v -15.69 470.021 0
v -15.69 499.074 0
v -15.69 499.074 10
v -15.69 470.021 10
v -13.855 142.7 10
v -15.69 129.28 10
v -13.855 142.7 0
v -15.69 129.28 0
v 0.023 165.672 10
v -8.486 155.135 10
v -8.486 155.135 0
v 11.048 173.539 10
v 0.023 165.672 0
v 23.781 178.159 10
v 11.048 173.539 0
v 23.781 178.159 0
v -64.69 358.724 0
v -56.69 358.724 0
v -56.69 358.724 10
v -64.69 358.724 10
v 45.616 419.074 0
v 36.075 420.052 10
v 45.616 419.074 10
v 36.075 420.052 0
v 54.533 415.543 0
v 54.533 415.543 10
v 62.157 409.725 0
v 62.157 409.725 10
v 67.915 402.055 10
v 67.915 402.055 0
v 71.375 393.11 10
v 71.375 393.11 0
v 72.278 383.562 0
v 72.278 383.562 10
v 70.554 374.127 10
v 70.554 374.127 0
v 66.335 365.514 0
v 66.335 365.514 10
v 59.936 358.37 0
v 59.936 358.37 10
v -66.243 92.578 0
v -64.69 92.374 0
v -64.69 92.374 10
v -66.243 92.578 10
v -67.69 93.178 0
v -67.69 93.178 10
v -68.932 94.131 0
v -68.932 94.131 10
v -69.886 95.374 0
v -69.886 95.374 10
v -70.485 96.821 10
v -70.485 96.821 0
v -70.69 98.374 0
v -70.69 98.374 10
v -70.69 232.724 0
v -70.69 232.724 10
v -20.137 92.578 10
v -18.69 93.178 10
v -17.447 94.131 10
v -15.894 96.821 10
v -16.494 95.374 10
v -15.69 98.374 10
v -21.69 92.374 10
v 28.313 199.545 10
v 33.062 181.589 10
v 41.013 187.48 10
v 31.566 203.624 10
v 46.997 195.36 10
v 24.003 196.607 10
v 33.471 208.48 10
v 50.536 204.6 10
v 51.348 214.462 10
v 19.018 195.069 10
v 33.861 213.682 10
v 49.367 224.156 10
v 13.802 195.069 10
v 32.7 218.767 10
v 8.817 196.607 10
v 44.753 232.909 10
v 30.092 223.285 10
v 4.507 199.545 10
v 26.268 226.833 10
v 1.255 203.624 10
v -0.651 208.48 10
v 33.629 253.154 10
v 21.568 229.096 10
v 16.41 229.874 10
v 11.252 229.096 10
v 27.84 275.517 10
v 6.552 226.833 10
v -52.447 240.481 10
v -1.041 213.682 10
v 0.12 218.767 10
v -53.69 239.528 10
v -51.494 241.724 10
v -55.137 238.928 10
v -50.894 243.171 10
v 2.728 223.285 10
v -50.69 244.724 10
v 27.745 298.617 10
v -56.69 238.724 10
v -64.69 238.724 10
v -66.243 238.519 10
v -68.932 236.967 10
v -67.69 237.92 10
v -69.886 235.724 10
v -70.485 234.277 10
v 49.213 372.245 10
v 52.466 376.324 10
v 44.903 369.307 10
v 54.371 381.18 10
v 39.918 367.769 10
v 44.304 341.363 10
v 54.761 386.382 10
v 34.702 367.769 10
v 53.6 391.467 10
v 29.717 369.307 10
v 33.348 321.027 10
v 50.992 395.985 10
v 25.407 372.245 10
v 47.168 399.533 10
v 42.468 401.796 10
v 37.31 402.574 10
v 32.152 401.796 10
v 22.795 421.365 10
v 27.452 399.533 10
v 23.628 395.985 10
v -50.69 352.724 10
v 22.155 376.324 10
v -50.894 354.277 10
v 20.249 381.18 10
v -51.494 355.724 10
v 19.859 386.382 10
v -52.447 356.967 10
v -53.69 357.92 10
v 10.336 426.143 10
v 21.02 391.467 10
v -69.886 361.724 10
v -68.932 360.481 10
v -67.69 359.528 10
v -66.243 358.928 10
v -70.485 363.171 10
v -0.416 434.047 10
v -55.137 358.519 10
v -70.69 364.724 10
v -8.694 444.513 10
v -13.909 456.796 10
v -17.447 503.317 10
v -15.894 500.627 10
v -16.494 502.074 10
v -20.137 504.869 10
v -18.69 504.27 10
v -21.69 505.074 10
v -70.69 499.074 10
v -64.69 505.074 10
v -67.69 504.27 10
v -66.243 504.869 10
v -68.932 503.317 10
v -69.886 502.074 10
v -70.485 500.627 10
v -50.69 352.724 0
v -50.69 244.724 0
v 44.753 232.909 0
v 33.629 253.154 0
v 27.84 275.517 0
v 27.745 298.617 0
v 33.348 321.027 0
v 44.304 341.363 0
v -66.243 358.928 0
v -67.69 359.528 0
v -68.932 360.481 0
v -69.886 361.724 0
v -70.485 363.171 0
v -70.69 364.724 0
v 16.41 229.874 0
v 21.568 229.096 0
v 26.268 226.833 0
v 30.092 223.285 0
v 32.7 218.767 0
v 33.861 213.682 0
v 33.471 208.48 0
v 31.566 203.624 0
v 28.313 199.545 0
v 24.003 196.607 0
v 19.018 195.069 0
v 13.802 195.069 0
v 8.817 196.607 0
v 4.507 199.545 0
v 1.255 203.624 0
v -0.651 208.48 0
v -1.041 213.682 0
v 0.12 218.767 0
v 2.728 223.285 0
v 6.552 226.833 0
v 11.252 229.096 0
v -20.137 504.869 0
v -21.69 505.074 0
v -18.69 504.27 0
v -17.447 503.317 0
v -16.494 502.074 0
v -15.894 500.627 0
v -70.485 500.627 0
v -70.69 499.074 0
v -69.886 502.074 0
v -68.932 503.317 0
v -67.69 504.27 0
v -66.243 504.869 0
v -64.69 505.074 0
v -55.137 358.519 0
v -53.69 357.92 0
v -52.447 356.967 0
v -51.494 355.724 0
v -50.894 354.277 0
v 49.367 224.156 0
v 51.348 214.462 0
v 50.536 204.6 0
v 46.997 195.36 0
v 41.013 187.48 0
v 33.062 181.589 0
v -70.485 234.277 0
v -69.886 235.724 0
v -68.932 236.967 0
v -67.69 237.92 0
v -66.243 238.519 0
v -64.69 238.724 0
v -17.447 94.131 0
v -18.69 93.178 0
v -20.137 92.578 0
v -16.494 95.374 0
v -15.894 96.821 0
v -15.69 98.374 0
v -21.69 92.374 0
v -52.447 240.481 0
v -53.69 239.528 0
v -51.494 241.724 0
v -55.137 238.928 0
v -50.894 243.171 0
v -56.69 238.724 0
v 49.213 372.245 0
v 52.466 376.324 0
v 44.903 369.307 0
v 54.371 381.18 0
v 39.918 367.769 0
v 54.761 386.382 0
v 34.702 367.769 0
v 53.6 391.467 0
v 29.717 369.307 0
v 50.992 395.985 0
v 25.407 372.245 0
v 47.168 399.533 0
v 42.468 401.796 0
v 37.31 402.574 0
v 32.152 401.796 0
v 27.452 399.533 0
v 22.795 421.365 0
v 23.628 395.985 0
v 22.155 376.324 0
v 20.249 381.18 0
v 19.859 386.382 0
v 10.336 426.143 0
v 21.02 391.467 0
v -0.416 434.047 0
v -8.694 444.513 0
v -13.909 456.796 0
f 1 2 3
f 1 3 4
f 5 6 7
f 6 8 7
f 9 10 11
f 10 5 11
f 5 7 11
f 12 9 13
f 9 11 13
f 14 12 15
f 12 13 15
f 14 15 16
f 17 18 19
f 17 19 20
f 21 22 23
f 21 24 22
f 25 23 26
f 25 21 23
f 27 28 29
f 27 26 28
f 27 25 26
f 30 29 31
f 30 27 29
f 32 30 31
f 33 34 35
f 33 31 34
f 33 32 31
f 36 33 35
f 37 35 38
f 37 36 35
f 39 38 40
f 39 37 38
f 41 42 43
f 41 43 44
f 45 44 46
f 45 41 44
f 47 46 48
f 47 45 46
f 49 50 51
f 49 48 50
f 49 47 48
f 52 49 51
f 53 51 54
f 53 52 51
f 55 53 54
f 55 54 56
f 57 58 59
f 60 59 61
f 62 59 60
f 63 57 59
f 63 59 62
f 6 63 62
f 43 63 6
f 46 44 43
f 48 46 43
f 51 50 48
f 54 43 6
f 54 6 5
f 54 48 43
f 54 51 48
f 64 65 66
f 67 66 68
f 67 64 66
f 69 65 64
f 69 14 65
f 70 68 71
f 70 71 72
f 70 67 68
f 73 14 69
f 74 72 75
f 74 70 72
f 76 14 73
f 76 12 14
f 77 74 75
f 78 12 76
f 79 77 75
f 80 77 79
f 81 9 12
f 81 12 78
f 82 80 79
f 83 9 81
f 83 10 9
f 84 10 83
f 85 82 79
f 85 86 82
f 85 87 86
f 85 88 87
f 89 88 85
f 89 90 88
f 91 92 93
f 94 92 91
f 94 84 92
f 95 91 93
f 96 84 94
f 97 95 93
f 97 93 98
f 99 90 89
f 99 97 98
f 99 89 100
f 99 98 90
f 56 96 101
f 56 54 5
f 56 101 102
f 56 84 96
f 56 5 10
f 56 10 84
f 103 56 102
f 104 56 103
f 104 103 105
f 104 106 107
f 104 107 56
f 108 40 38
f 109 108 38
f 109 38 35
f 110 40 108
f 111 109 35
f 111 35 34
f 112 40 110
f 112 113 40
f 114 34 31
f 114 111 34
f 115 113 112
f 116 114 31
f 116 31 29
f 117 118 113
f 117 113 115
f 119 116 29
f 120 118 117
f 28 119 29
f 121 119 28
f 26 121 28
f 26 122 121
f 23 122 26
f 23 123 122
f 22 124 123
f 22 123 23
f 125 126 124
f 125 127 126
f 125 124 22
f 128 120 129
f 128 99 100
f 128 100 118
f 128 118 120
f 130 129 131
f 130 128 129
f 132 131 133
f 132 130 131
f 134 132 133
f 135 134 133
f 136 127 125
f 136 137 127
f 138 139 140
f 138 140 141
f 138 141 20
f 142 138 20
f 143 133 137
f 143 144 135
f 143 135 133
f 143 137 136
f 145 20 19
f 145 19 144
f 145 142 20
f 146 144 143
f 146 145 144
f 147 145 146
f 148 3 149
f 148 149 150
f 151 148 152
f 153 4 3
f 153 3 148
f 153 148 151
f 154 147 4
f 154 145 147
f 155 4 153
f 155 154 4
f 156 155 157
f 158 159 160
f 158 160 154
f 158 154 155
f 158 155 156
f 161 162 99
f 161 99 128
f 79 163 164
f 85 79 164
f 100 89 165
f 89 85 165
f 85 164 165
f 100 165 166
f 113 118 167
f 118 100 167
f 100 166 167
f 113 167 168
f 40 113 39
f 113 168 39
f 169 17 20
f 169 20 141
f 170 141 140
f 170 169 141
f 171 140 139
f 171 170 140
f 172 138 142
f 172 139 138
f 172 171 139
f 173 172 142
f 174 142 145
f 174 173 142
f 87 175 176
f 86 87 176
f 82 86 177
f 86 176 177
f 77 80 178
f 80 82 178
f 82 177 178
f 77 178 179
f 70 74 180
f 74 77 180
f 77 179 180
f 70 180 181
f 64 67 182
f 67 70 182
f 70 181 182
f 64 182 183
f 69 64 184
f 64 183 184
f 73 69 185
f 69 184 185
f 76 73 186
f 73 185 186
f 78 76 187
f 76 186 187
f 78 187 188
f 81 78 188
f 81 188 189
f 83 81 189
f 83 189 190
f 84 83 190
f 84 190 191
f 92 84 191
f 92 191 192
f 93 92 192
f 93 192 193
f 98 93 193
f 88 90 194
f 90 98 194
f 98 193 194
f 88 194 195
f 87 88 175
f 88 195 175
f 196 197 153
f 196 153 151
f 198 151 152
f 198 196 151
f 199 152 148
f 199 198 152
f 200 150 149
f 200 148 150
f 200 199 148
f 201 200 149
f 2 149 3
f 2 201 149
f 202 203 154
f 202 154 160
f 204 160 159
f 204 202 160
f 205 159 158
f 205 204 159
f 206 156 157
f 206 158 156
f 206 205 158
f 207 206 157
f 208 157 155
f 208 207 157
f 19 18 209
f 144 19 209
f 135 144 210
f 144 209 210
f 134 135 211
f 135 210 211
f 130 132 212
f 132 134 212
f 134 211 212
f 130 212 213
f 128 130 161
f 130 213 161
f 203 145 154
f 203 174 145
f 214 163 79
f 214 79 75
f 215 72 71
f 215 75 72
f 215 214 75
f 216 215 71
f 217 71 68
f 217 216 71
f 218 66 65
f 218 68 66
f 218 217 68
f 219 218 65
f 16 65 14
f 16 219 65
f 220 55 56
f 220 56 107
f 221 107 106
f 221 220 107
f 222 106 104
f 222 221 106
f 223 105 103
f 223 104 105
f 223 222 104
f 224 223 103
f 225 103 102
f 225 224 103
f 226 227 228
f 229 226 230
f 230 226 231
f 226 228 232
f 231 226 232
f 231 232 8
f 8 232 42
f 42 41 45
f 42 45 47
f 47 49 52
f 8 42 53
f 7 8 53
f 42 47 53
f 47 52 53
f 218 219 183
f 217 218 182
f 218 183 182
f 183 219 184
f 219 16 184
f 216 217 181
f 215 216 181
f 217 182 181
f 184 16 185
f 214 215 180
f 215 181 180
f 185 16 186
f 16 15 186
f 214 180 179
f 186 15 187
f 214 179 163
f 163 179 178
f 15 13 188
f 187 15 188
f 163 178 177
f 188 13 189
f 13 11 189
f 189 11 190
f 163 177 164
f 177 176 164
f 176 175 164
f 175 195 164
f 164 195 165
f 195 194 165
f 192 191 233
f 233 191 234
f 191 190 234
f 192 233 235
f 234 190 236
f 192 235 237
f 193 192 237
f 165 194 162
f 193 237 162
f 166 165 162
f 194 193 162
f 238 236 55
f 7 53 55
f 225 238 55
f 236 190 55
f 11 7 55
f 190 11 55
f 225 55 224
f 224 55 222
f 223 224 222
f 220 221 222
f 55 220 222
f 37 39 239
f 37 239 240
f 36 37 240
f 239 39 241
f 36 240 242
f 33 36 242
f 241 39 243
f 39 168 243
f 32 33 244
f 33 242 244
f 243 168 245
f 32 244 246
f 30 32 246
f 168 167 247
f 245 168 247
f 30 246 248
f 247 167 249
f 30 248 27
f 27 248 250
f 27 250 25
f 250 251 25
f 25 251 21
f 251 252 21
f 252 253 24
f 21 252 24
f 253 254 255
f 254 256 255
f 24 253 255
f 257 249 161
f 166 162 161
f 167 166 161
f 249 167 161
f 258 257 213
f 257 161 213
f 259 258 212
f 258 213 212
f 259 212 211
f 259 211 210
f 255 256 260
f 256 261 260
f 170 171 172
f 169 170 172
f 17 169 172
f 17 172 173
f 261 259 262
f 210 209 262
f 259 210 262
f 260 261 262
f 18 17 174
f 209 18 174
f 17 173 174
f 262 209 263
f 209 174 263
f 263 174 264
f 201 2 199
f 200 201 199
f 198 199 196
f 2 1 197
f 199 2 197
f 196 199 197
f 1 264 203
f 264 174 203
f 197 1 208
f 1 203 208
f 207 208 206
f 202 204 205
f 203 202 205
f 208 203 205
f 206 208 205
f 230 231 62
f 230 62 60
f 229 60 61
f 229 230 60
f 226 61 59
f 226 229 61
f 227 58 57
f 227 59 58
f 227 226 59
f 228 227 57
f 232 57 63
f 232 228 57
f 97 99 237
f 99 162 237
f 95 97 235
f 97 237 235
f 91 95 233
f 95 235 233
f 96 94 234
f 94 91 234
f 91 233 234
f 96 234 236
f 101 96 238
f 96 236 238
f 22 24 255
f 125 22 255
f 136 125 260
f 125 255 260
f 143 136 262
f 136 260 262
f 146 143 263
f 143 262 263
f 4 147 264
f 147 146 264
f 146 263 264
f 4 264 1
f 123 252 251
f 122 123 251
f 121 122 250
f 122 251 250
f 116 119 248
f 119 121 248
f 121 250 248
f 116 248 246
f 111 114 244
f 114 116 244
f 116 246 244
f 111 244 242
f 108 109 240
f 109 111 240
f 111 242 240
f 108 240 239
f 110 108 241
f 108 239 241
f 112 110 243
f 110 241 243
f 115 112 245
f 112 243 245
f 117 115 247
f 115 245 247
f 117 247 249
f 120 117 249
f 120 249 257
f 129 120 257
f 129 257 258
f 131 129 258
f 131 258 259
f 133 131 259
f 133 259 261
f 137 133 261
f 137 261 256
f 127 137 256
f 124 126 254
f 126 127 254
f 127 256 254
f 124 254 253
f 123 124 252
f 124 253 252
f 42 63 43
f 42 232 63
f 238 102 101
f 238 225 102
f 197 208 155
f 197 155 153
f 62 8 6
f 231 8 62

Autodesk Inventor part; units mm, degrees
ref_plane "YZ Plane" through (0, 0, 0) normal (1, 0, 0) x (0, 1, 0)
ref_plane "XZ Plane" through (0, 0, 0) normal (0, 1, 0) x (-1, 0, 0)
ref_plane "XY Plane" through (0, 0, 0) normal (0, 0, 1) x (1, 0, 0)
sketch "Sketch1" plane through (0, 0, 0) normal (0, 0, 1) x (0, 1, 0)
  line L0 (98.3739, 70.6898) -> (232.7239, 70.6898)
  line L1 (238.7239, 64.6898) -> (238.7239, 56.6898)
  line L2 (244.7239, 50.6898) -> (352.7239, 50.6898)
  line L3 (358.7239, 56.6898) -> (358.7239, 64.6898)
  line L4 (364.7239, 70.6898) -> (499.0739, 70.6898)
  line L5 (505.0739, 64.6898) -> (505.0739, 21.6898)
  line L6 (499.0739, 15.6898) -> (470.0209, 15.6898)
  arc A0 (470.0209, 15.6898) -> (420.0521, -36.0749) centre (470.0209, -34.3102) ccw
  arc A1 (358.3704, -59.936) -> (420.0521, -36.0749) centre (385.0739, -37.3102) ccw
  arc A2 (358.3704, -59.936) -> (232.9093, -44.7528) centre (287.4489, -120.0273) ccw
  arc A3 (178.1588, -23.7808) -> (232.9093, -44.7528) centre (212.3739, -16.4102) ccw
  line L7 (129.28, 15.6898) -> (98.3739, 15.6898)
  line L8 (92.3739, 21.6898) -> (92.3739, 64.6898)
  circle A4 centre (212.3739, -16.4102) radius 17.5
  circle A5 centre (385.0739, -37.3102) radius 17.5
  arc A6 (178.1588, -23.7808) -> (129.28, 15.6898) centre (129.28, -34.3102) ccw
  arc A7 (92.3739, 21.6898) -> (98.3739, 15.6898) centre (98.3739, 21.6898) ccw
  arc A8 (98.3739, 70.6898) -> (92.3739, 64.6898) centre (98.3739, 64.6898) ccw
  arc A9 (238.7239, 64.6898) -> (232.7239, 70.6898) centre (232.7239, 64.6898) ccw
  arc A10 (238.7239, 56.6898) -> (244.7239, 50.6898) centre (244.7239, 56.6898) ccw
  arc A11 (352.7239, 50.6898) -> (358.7239, 56.6898) centre (352.7239, 56.6898) ccw
  arc A12 (364.7239, 70.6898) -> (358.7239, 64.6898) centre (364.7239, 64.6898) ccw
  arc A13 (505.0739, 64.6898) -> (499.0739, 70.6898) centre (499.0739, 64.6898) ccw
  arc A14 (499.0739, 15.6898) -> (505.0739, 21.6898) centre (499.0739, 21.6898) ccw
  point P0 (238.7239, 50.6898)
  point P1 (358.7239, 50.6898)
  point P2 (505.0739, 70.6898)
  point P3 (505.0739, 15.6898)
  dimension "d0" = 172.7
  dimension "d1" = 20.9
  dimension "d2" = 67.1
  dimension "d3" = 20
  dimension "d4" = 35
  dimension "d5" = 35
  dimension "d6" = 120
  dimension "d7" = 120
  dimension "d8" = 120
  dimension "d9" = 55
  dimension "d10" = 35
  dimension "d11" = 35
  dimension "d12" = 50
  dimension "d13" = 50
  dimension "d14" = 26.35
  dimension "d15" = 6
extrude "Extrusion1" add sketch "Sketch1" along normal blind 10
equation "\"d14\" = -0.5 * d6 + 0.5 * d0"
properties part number "3136 1133 83" material "Steel, Mild"
